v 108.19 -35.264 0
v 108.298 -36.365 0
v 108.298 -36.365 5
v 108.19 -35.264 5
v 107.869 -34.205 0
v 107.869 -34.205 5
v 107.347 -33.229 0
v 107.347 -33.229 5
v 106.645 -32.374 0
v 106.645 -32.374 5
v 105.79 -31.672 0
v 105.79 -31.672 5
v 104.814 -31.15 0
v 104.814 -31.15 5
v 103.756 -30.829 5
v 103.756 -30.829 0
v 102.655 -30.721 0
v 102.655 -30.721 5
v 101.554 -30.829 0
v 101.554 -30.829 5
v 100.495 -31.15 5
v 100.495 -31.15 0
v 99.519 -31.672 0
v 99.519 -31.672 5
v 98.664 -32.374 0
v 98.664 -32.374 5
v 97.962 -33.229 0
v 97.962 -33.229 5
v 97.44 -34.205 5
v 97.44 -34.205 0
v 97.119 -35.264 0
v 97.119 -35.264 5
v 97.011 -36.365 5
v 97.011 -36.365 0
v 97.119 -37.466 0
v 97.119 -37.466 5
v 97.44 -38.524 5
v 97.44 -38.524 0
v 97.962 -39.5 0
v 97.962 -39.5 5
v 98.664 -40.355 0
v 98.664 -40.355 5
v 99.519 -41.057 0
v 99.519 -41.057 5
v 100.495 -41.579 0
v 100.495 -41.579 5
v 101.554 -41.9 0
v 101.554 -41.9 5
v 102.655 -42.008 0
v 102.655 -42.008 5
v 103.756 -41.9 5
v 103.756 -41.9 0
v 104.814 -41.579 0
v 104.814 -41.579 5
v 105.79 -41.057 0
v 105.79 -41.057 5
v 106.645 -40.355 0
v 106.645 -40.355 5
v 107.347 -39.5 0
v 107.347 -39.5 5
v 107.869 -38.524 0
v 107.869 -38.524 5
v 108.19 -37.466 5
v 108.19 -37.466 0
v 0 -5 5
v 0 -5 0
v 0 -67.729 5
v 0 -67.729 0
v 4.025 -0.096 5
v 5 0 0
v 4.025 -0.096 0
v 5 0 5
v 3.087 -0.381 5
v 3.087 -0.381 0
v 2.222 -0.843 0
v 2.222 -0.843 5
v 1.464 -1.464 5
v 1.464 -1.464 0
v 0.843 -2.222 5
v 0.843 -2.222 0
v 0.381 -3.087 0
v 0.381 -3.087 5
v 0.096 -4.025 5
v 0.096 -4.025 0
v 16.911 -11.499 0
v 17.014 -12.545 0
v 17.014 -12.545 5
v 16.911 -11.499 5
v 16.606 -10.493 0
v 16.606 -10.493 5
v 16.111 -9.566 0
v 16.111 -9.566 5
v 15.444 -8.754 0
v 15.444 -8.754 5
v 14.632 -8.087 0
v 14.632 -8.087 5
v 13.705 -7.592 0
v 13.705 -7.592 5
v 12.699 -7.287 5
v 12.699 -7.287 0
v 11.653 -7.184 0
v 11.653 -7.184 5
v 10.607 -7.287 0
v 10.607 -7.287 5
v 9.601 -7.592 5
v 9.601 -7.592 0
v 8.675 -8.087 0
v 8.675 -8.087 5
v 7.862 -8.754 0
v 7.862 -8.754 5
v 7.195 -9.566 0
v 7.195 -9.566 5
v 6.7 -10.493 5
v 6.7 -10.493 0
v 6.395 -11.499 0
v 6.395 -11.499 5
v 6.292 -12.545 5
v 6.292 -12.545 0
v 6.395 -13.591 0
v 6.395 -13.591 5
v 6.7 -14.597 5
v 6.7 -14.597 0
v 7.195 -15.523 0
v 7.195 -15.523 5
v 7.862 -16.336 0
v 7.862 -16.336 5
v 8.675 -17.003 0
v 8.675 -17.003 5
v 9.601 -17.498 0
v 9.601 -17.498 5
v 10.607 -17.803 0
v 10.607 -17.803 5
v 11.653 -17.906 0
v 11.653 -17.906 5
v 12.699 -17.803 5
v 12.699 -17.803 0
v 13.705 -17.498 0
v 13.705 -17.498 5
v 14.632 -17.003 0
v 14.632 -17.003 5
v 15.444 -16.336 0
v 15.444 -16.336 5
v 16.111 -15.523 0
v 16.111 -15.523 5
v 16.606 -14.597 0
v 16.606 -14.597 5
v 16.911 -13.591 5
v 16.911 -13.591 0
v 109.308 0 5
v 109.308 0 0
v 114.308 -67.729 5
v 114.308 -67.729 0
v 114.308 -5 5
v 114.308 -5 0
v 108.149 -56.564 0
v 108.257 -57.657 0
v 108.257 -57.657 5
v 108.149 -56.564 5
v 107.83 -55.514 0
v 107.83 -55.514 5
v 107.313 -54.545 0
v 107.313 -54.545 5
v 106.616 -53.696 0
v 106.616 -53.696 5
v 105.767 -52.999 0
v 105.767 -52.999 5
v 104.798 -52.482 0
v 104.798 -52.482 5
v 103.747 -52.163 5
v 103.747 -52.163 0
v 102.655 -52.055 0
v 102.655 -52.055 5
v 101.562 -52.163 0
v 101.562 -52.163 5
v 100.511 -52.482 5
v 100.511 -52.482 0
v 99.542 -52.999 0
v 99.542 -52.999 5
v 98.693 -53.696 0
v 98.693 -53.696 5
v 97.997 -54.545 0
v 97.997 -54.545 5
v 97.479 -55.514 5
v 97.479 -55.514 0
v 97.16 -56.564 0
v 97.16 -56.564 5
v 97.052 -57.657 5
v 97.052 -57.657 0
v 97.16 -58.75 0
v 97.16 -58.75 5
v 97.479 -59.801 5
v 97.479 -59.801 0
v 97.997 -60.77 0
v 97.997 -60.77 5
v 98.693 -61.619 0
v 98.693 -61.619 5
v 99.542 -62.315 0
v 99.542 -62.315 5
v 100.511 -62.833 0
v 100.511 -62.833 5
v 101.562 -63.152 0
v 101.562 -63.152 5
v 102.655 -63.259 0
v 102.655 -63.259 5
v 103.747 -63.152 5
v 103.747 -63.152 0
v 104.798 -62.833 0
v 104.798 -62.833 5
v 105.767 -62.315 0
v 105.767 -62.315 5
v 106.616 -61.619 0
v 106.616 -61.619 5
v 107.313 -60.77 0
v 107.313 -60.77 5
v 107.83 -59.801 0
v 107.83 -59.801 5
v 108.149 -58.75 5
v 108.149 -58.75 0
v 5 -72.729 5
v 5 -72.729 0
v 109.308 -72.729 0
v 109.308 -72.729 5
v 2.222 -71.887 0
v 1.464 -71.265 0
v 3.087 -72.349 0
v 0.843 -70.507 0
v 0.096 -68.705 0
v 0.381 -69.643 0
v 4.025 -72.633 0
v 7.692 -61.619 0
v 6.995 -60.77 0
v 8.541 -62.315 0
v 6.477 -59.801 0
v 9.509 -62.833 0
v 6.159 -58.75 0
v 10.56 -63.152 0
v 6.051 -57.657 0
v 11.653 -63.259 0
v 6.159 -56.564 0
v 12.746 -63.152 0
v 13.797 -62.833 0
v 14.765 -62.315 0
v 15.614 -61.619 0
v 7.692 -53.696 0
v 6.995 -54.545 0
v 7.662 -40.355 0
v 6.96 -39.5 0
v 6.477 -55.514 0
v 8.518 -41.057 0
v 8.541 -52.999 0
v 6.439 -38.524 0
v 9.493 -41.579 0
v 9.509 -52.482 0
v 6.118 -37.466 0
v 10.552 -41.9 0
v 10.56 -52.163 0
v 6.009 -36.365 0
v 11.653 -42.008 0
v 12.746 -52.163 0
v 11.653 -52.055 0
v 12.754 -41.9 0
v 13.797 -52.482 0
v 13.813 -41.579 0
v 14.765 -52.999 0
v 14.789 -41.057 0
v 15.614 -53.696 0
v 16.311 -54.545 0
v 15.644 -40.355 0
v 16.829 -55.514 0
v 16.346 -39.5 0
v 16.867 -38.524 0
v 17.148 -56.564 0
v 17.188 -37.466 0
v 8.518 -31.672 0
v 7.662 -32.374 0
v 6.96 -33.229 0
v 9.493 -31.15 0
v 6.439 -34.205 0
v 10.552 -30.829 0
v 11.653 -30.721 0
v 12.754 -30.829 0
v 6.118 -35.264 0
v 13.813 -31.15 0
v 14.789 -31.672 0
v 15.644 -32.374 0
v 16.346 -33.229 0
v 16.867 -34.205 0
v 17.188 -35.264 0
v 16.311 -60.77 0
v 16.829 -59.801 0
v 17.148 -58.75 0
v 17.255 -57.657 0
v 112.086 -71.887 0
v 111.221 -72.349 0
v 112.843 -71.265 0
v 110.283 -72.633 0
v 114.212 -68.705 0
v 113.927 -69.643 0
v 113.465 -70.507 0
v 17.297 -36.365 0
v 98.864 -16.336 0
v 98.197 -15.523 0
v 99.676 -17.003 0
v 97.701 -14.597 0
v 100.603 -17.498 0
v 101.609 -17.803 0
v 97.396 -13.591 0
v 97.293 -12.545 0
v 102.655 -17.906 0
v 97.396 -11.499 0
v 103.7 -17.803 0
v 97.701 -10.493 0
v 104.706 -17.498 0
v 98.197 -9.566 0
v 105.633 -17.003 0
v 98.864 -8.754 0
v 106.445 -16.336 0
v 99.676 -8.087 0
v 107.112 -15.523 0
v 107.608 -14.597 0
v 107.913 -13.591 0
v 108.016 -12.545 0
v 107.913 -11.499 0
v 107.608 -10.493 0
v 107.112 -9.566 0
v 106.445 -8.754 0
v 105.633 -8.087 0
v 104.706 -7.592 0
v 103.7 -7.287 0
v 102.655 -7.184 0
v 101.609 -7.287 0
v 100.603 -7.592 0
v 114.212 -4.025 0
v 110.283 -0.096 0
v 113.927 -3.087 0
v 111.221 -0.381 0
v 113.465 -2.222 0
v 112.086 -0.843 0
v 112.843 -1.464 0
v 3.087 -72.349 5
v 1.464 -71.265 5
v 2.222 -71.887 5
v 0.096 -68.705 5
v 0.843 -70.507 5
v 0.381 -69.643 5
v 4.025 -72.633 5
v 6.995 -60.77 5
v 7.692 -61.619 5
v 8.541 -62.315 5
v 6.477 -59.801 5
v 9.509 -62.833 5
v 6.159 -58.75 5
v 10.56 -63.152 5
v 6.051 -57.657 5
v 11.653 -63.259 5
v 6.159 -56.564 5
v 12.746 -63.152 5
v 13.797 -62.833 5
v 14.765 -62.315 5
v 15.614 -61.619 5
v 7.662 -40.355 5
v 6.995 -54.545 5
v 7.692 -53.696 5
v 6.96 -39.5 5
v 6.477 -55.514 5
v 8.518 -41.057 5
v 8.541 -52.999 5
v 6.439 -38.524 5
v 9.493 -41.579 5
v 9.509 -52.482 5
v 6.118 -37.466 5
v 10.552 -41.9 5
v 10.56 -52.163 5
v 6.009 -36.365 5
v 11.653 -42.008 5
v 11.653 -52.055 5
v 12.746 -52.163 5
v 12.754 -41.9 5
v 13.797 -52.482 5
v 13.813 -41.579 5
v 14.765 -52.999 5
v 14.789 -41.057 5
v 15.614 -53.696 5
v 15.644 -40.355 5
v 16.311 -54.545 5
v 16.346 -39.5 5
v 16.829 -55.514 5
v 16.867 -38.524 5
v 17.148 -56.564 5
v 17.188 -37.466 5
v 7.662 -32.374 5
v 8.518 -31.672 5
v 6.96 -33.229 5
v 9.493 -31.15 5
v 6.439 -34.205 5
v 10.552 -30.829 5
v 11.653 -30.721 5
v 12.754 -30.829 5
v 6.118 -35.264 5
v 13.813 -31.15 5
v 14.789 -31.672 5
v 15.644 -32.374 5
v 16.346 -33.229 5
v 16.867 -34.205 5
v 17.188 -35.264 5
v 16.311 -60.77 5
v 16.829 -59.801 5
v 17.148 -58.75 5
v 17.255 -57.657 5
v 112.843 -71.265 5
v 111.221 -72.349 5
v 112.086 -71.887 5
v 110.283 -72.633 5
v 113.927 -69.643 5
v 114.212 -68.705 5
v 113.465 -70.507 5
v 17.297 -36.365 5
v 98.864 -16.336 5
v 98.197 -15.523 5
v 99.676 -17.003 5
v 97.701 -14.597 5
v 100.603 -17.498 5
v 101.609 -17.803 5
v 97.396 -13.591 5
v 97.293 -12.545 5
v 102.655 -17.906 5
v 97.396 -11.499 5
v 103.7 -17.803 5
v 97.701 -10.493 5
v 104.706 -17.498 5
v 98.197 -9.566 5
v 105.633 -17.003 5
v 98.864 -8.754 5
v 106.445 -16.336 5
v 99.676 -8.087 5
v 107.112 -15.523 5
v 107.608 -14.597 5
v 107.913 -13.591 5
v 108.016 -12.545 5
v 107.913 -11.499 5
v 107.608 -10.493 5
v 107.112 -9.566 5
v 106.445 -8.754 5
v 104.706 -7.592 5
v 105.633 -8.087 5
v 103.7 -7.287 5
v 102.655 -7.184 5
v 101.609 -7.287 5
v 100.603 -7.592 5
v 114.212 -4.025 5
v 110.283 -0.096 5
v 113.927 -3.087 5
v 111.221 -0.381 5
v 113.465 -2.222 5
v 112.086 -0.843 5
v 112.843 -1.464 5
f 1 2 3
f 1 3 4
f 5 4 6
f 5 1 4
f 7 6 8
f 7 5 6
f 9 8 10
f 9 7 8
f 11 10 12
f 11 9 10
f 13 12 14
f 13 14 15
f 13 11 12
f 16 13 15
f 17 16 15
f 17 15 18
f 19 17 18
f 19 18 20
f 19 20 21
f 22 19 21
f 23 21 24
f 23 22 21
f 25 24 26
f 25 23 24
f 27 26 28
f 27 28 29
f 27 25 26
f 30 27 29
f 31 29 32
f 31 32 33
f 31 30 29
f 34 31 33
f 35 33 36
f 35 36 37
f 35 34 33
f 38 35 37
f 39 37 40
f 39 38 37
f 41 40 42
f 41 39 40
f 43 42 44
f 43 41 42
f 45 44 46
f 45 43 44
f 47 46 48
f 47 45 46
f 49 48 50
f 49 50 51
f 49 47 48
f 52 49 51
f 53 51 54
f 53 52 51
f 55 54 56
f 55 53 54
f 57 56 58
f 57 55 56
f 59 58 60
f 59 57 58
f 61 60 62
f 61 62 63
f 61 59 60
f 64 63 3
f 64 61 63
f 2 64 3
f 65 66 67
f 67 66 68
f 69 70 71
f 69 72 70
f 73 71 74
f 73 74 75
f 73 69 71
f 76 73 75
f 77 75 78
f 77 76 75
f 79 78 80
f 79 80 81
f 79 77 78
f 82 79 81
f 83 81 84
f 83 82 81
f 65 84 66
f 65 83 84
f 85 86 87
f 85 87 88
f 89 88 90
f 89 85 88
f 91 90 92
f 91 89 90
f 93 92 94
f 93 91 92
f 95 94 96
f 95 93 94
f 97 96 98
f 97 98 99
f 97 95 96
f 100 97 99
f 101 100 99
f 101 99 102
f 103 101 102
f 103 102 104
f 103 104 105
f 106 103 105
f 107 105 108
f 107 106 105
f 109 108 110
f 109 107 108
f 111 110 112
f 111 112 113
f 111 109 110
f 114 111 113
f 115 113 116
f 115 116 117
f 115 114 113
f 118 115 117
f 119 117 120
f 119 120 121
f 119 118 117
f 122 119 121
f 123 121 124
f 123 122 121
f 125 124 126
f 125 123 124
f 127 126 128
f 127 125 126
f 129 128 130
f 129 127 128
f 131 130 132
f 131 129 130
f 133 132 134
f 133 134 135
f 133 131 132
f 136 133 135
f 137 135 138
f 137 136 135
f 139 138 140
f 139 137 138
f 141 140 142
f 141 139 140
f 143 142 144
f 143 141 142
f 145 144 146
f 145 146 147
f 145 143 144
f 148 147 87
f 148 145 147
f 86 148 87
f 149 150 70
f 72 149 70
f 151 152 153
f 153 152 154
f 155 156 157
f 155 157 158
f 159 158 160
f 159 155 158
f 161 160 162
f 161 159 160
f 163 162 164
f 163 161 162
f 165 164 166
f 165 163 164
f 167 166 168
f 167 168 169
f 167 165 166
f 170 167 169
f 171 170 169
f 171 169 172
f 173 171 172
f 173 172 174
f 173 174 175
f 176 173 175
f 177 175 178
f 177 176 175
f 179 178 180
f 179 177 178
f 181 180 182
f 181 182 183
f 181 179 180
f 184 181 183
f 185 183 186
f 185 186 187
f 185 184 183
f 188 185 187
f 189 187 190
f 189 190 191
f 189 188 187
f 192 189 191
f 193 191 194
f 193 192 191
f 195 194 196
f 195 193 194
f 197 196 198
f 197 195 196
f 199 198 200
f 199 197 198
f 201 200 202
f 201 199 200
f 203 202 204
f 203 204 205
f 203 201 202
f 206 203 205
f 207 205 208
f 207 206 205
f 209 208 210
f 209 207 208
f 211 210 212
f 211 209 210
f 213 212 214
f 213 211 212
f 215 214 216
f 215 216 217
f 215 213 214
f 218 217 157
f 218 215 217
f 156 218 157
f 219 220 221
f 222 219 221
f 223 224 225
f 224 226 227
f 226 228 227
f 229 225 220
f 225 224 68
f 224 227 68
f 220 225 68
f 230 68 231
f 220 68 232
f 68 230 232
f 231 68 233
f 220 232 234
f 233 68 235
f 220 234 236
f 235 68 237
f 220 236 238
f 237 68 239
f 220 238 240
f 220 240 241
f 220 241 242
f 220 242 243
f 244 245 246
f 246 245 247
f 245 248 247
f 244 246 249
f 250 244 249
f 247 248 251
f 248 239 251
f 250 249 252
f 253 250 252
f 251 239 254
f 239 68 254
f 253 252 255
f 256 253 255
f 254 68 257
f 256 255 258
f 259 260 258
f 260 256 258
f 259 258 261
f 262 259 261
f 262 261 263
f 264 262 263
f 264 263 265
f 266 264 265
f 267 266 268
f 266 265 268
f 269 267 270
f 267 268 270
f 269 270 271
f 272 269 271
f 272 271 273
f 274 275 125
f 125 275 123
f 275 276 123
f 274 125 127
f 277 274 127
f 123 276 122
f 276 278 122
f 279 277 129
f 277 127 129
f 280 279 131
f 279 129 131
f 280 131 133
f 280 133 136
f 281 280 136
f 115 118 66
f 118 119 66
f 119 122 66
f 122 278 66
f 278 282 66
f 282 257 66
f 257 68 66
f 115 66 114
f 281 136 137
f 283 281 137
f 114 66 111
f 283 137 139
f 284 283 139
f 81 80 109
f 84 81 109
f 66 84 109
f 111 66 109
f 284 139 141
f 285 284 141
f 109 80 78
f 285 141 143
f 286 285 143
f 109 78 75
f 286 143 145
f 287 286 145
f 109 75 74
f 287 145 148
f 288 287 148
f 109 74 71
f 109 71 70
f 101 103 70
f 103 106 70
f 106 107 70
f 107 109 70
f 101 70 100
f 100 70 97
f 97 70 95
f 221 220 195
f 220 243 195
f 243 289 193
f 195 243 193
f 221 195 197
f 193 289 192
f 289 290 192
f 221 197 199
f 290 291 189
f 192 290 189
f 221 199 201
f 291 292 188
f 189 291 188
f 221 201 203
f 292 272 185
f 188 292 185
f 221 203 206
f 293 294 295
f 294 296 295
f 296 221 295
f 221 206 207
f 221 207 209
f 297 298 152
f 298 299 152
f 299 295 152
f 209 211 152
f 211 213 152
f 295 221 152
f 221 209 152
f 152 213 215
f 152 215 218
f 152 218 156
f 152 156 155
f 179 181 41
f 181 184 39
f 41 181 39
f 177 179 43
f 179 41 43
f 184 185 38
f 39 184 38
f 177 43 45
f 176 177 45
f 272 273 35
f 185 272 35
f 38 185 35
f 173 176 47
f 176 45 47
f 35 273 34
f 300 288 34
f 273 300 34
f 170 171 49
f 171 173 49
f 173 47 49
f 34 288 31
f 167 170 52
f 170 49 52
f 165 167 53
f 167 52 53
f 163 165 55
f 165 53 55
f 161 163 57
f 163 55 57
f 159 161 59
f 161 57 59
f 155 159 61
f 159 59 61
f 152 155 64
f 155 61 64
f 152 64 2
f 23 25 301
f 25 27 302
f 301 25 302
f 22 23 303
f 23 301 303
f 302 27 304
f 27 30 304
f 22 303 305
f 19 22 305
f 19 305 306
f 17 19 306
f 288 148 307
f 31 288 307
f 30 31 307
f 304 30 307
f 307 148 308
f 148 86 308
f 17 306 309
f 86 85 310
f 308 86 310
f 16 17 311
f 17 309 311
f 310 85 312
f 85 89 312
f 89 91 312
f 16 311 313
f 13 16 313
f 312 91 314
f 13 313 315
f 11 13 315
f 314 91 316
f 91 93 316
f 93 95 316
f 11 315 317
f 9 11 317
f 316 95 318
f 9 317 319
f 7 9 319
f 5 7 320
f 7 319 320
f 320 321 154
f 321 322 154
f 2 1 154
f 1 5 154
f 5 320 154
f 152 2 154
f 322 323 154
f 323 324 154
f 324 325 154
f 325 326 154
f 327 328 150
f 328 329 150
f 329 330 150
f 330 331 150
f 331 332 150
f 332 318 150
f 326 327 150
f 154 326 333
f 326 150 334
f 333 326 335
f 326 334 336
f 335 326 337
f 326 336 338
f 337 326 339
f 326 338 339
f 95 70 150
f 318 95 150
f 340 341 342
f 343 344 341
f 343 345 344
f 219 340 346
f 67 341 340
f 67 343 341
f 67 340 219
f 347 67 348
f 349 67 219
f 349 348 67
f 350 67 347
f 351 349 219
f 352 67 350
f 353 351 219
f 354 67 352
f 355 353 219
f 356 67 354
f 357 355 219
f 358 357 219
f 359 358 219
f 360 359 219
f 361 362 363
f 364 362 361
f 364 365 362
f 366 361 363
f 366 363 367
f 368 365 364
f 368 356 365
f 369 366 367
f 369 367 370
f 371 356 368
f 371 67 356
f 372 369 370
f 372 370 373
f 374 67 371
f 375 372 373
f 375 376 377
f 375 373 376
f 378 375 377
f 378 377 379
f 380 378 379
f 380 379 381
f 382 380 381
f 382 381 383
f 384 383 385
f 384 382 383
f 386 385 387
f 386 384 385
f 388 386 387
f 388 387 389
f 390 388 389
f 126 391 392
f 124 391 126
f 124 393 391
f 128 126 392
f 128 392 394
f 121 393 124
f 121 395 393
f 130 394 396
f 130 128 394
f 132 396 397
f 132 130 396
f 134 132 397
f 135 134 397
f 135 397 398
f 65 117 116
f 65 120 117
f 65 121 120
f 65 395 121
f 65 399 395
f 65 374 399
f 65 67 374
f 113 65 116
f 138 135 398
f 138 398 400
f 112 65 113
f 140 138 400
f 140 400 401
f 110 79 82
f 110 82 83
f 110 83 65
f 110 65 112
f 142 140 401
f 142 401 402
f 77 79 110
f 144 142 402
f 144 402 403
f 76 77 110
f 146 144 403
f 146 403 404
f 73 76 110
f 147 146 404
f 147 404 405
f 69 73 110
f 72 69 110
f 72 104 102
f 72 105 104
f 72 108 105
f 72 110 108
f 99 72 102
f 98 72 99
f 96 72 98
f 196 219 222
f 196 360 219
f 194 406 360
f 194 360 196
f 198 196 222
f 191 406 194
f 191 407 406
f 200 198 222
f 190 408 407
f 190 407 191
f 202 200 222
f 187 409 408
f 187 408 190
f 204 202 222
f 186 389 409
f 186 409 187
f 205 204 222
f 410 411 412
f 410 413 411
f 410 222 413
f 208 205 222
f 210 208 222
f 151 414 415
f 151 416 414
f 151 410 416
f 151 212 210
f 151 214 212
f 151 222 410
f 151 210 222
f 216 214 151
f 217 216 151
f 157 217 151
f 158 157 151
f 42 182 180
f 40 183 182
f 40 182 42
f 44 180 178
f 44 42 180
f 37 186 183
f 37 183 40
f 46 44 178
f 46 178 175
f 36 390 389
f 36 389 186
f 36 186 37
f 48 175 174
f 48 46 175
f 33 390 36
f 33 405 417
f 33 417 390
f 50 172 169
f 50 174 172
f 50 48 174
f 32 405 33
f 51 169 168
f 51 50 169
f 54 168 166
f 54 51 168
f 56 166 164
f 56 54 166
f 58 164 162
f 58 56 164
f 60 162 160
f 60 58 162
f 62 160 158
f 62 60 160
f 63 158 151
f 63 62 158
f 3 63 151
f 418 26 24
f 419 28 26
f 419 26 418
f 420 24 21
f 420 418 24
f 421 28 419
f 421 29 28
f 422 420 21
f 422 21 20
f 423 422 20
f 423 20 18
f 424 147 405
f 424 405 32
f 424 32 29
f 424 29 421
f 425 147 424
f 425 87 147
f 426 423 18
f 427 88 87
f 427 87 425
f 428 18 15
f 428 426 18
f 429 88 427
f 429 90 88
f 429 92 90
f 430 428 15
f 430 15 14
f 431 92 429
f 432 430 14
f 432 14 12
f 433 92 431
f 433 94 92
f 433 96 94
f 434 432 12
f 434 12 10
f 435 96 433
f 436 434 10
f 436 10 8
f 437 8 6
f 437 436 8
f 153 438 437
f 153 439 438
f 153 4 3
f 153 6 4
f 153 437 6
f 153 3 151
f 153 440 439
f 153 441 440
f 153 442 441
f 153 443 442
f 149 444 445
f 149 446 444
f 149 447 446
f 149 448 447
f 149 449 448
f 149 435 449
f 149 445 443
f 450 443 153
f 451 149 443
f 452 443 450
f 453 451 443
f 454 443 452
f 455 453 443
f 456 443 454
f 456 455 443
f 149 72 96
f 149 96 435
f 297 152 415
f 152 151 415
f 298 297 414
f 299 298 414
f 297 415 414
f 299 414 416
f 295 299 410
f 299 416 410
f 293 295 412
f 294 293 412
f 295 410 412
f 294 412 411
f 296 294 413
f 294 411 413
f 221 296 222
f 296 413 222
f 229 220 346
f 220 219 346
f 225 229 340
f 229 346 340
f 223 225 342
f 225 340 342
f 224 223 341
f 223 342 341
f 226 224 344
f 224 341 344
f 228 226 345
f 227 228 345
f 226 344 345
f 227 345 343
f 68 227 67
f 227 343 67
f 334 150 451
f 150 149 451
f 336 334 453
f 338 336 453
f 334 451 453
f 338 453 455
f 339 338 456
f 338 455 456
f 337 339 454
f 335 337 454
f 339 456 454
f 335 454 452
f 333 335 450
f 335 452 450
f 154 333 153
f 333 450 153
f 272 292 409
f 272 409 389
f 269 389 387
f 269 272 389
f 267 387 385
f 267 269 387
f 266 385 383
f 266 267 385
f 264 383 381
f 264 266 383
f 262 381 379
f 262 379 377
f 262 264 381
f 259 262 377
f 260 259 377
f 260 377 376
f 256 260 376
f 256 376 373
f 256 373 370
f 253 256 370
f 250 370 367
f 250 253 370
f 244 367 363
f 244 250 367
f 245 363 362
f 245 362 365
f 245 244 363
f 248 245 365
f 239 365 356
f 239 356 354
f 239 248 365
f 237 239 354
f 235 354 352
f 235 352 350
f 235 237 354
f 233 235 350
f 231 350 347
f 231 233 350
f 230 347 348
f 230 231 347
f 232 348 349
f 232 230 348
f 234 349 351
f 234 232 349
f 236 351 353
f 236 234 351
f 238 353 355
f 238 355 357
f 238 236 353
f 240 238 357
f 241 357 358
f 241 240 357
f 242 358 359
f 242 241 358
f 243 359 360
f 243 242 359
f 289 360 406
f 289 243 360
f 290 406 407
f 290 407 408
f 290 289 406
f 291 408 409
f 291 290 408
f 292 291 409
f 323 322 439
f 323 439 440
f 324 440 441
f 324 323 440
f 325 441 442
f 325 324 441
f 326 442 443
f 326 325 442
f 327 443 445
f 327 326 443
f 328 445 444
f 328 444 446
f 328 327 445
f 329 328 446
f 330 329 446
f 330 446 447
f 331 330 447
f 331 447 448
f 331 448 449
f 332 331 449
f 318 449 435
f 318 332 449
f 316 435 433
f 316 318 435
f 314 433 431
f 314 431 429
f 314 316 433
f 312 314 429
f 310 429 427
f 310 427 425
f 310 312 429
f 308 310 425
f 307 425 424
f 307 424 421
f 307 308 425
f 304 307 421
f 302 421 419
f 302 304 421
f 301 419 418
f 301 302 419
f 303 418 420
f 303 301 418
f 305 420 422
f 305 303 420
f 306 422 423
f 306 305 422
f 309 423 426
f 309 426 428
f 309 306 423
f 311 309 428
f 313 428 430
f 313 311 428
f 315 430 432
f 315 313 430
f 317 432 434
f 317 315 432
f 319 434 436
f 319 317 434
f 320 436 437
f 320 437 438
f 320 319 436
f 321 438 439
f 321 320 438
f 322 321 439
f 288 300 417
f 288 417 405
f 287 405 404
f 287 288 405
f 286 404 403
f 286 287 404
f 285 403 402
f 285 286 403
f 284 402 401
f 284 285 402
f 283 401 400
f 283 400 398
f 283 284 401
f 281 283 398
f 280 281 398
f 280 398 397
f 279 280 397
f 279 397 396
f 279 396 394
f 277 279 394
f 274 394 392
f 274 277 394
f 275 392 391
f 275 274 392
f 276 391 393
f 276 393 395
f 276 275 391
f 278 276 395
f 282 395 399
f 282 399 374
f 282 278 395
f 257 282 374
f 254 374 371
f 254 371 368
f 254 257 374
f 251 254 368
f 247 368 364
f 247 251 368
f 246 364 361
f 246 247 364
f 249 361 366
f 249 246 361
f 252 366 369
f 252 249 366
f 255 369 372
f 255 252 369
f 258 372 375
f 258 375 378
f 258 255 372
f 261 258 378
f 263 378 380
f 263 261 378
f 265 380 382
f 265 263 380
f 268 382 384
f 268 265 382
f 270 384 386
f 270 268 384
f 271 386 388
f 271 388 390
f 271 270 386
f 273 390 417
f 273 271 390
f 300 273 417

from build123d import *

# Parameters (mm, degrees)
F0_R     = 5.602125
F0_R_2   = 5.64379
F0_R_3   = 5.361194
F1_DEPTH = 5
F2_R     = 5
F3_R     = 5
F4_R     = 5
F5_R     = 5


with BuildPart() as f1:
    # F0 (on Top) → F1 (new body)
    with BuildSketch(Plane.XY):
        Polygon((57.153843, 0), (0, 0), (0, -72.72923), (114.307687, -72.72923), (114.307687, 0), align=None)
        with Locations((11.653123, -57.657372)):
            Circle(F0_R, mode=Mode.SUBTRACT)
        with Locations((102.654563, -57.657372)):
            Circle(F0_R, mode=Mode.SUBTRACT)
        with Locations((11.653123, -36.364615)):
            Circle(F0_R_2, mode=Mode.SUBTRACT)
        with Locations((11.653123, -12.544865)):
            Circle(F0_R_3, mode=Mode.SUBTRACT)
        with Locations((102.654563, -36.364615)):
            Circle(F0_R_2, mode=Mode.SUBTRACT)
        with Locations((102.654563, -12.544865)):
            Circle(F0_R_3, mode=Mode.SUBTRACT)
    extrude(amount=F1_DEPTH)

    # F2
    f2_edges = [f1.edges().sort_by_distance(p)[0] for p in [
        (114.307687, 0, 2.5),
    ]]
    fillet(f2_edges, radius=F2_R)

    # F3
    f3_edges = [f1.edges().sort_by_distance(p)[0] for p in [
        (0, 0, 2.5),
    ]]
    fillet(f3_edges, radius=F3_R)

    # F4
    f4_edges = [f1.edges().sort_by_distance(p)[0] for p in [
        (114.307687, -72.72923, 2.5),
    ]]
    fillet(f4_edges, radius=F4_R)

    # F5
    f5_edges = [f1.edges().sort_by_distance(p)[0] for p in [
        (0, -72.72923, 2.5),
    ]]
    fillet(f5_edges, radius=F5_R)


solid = f1.part
